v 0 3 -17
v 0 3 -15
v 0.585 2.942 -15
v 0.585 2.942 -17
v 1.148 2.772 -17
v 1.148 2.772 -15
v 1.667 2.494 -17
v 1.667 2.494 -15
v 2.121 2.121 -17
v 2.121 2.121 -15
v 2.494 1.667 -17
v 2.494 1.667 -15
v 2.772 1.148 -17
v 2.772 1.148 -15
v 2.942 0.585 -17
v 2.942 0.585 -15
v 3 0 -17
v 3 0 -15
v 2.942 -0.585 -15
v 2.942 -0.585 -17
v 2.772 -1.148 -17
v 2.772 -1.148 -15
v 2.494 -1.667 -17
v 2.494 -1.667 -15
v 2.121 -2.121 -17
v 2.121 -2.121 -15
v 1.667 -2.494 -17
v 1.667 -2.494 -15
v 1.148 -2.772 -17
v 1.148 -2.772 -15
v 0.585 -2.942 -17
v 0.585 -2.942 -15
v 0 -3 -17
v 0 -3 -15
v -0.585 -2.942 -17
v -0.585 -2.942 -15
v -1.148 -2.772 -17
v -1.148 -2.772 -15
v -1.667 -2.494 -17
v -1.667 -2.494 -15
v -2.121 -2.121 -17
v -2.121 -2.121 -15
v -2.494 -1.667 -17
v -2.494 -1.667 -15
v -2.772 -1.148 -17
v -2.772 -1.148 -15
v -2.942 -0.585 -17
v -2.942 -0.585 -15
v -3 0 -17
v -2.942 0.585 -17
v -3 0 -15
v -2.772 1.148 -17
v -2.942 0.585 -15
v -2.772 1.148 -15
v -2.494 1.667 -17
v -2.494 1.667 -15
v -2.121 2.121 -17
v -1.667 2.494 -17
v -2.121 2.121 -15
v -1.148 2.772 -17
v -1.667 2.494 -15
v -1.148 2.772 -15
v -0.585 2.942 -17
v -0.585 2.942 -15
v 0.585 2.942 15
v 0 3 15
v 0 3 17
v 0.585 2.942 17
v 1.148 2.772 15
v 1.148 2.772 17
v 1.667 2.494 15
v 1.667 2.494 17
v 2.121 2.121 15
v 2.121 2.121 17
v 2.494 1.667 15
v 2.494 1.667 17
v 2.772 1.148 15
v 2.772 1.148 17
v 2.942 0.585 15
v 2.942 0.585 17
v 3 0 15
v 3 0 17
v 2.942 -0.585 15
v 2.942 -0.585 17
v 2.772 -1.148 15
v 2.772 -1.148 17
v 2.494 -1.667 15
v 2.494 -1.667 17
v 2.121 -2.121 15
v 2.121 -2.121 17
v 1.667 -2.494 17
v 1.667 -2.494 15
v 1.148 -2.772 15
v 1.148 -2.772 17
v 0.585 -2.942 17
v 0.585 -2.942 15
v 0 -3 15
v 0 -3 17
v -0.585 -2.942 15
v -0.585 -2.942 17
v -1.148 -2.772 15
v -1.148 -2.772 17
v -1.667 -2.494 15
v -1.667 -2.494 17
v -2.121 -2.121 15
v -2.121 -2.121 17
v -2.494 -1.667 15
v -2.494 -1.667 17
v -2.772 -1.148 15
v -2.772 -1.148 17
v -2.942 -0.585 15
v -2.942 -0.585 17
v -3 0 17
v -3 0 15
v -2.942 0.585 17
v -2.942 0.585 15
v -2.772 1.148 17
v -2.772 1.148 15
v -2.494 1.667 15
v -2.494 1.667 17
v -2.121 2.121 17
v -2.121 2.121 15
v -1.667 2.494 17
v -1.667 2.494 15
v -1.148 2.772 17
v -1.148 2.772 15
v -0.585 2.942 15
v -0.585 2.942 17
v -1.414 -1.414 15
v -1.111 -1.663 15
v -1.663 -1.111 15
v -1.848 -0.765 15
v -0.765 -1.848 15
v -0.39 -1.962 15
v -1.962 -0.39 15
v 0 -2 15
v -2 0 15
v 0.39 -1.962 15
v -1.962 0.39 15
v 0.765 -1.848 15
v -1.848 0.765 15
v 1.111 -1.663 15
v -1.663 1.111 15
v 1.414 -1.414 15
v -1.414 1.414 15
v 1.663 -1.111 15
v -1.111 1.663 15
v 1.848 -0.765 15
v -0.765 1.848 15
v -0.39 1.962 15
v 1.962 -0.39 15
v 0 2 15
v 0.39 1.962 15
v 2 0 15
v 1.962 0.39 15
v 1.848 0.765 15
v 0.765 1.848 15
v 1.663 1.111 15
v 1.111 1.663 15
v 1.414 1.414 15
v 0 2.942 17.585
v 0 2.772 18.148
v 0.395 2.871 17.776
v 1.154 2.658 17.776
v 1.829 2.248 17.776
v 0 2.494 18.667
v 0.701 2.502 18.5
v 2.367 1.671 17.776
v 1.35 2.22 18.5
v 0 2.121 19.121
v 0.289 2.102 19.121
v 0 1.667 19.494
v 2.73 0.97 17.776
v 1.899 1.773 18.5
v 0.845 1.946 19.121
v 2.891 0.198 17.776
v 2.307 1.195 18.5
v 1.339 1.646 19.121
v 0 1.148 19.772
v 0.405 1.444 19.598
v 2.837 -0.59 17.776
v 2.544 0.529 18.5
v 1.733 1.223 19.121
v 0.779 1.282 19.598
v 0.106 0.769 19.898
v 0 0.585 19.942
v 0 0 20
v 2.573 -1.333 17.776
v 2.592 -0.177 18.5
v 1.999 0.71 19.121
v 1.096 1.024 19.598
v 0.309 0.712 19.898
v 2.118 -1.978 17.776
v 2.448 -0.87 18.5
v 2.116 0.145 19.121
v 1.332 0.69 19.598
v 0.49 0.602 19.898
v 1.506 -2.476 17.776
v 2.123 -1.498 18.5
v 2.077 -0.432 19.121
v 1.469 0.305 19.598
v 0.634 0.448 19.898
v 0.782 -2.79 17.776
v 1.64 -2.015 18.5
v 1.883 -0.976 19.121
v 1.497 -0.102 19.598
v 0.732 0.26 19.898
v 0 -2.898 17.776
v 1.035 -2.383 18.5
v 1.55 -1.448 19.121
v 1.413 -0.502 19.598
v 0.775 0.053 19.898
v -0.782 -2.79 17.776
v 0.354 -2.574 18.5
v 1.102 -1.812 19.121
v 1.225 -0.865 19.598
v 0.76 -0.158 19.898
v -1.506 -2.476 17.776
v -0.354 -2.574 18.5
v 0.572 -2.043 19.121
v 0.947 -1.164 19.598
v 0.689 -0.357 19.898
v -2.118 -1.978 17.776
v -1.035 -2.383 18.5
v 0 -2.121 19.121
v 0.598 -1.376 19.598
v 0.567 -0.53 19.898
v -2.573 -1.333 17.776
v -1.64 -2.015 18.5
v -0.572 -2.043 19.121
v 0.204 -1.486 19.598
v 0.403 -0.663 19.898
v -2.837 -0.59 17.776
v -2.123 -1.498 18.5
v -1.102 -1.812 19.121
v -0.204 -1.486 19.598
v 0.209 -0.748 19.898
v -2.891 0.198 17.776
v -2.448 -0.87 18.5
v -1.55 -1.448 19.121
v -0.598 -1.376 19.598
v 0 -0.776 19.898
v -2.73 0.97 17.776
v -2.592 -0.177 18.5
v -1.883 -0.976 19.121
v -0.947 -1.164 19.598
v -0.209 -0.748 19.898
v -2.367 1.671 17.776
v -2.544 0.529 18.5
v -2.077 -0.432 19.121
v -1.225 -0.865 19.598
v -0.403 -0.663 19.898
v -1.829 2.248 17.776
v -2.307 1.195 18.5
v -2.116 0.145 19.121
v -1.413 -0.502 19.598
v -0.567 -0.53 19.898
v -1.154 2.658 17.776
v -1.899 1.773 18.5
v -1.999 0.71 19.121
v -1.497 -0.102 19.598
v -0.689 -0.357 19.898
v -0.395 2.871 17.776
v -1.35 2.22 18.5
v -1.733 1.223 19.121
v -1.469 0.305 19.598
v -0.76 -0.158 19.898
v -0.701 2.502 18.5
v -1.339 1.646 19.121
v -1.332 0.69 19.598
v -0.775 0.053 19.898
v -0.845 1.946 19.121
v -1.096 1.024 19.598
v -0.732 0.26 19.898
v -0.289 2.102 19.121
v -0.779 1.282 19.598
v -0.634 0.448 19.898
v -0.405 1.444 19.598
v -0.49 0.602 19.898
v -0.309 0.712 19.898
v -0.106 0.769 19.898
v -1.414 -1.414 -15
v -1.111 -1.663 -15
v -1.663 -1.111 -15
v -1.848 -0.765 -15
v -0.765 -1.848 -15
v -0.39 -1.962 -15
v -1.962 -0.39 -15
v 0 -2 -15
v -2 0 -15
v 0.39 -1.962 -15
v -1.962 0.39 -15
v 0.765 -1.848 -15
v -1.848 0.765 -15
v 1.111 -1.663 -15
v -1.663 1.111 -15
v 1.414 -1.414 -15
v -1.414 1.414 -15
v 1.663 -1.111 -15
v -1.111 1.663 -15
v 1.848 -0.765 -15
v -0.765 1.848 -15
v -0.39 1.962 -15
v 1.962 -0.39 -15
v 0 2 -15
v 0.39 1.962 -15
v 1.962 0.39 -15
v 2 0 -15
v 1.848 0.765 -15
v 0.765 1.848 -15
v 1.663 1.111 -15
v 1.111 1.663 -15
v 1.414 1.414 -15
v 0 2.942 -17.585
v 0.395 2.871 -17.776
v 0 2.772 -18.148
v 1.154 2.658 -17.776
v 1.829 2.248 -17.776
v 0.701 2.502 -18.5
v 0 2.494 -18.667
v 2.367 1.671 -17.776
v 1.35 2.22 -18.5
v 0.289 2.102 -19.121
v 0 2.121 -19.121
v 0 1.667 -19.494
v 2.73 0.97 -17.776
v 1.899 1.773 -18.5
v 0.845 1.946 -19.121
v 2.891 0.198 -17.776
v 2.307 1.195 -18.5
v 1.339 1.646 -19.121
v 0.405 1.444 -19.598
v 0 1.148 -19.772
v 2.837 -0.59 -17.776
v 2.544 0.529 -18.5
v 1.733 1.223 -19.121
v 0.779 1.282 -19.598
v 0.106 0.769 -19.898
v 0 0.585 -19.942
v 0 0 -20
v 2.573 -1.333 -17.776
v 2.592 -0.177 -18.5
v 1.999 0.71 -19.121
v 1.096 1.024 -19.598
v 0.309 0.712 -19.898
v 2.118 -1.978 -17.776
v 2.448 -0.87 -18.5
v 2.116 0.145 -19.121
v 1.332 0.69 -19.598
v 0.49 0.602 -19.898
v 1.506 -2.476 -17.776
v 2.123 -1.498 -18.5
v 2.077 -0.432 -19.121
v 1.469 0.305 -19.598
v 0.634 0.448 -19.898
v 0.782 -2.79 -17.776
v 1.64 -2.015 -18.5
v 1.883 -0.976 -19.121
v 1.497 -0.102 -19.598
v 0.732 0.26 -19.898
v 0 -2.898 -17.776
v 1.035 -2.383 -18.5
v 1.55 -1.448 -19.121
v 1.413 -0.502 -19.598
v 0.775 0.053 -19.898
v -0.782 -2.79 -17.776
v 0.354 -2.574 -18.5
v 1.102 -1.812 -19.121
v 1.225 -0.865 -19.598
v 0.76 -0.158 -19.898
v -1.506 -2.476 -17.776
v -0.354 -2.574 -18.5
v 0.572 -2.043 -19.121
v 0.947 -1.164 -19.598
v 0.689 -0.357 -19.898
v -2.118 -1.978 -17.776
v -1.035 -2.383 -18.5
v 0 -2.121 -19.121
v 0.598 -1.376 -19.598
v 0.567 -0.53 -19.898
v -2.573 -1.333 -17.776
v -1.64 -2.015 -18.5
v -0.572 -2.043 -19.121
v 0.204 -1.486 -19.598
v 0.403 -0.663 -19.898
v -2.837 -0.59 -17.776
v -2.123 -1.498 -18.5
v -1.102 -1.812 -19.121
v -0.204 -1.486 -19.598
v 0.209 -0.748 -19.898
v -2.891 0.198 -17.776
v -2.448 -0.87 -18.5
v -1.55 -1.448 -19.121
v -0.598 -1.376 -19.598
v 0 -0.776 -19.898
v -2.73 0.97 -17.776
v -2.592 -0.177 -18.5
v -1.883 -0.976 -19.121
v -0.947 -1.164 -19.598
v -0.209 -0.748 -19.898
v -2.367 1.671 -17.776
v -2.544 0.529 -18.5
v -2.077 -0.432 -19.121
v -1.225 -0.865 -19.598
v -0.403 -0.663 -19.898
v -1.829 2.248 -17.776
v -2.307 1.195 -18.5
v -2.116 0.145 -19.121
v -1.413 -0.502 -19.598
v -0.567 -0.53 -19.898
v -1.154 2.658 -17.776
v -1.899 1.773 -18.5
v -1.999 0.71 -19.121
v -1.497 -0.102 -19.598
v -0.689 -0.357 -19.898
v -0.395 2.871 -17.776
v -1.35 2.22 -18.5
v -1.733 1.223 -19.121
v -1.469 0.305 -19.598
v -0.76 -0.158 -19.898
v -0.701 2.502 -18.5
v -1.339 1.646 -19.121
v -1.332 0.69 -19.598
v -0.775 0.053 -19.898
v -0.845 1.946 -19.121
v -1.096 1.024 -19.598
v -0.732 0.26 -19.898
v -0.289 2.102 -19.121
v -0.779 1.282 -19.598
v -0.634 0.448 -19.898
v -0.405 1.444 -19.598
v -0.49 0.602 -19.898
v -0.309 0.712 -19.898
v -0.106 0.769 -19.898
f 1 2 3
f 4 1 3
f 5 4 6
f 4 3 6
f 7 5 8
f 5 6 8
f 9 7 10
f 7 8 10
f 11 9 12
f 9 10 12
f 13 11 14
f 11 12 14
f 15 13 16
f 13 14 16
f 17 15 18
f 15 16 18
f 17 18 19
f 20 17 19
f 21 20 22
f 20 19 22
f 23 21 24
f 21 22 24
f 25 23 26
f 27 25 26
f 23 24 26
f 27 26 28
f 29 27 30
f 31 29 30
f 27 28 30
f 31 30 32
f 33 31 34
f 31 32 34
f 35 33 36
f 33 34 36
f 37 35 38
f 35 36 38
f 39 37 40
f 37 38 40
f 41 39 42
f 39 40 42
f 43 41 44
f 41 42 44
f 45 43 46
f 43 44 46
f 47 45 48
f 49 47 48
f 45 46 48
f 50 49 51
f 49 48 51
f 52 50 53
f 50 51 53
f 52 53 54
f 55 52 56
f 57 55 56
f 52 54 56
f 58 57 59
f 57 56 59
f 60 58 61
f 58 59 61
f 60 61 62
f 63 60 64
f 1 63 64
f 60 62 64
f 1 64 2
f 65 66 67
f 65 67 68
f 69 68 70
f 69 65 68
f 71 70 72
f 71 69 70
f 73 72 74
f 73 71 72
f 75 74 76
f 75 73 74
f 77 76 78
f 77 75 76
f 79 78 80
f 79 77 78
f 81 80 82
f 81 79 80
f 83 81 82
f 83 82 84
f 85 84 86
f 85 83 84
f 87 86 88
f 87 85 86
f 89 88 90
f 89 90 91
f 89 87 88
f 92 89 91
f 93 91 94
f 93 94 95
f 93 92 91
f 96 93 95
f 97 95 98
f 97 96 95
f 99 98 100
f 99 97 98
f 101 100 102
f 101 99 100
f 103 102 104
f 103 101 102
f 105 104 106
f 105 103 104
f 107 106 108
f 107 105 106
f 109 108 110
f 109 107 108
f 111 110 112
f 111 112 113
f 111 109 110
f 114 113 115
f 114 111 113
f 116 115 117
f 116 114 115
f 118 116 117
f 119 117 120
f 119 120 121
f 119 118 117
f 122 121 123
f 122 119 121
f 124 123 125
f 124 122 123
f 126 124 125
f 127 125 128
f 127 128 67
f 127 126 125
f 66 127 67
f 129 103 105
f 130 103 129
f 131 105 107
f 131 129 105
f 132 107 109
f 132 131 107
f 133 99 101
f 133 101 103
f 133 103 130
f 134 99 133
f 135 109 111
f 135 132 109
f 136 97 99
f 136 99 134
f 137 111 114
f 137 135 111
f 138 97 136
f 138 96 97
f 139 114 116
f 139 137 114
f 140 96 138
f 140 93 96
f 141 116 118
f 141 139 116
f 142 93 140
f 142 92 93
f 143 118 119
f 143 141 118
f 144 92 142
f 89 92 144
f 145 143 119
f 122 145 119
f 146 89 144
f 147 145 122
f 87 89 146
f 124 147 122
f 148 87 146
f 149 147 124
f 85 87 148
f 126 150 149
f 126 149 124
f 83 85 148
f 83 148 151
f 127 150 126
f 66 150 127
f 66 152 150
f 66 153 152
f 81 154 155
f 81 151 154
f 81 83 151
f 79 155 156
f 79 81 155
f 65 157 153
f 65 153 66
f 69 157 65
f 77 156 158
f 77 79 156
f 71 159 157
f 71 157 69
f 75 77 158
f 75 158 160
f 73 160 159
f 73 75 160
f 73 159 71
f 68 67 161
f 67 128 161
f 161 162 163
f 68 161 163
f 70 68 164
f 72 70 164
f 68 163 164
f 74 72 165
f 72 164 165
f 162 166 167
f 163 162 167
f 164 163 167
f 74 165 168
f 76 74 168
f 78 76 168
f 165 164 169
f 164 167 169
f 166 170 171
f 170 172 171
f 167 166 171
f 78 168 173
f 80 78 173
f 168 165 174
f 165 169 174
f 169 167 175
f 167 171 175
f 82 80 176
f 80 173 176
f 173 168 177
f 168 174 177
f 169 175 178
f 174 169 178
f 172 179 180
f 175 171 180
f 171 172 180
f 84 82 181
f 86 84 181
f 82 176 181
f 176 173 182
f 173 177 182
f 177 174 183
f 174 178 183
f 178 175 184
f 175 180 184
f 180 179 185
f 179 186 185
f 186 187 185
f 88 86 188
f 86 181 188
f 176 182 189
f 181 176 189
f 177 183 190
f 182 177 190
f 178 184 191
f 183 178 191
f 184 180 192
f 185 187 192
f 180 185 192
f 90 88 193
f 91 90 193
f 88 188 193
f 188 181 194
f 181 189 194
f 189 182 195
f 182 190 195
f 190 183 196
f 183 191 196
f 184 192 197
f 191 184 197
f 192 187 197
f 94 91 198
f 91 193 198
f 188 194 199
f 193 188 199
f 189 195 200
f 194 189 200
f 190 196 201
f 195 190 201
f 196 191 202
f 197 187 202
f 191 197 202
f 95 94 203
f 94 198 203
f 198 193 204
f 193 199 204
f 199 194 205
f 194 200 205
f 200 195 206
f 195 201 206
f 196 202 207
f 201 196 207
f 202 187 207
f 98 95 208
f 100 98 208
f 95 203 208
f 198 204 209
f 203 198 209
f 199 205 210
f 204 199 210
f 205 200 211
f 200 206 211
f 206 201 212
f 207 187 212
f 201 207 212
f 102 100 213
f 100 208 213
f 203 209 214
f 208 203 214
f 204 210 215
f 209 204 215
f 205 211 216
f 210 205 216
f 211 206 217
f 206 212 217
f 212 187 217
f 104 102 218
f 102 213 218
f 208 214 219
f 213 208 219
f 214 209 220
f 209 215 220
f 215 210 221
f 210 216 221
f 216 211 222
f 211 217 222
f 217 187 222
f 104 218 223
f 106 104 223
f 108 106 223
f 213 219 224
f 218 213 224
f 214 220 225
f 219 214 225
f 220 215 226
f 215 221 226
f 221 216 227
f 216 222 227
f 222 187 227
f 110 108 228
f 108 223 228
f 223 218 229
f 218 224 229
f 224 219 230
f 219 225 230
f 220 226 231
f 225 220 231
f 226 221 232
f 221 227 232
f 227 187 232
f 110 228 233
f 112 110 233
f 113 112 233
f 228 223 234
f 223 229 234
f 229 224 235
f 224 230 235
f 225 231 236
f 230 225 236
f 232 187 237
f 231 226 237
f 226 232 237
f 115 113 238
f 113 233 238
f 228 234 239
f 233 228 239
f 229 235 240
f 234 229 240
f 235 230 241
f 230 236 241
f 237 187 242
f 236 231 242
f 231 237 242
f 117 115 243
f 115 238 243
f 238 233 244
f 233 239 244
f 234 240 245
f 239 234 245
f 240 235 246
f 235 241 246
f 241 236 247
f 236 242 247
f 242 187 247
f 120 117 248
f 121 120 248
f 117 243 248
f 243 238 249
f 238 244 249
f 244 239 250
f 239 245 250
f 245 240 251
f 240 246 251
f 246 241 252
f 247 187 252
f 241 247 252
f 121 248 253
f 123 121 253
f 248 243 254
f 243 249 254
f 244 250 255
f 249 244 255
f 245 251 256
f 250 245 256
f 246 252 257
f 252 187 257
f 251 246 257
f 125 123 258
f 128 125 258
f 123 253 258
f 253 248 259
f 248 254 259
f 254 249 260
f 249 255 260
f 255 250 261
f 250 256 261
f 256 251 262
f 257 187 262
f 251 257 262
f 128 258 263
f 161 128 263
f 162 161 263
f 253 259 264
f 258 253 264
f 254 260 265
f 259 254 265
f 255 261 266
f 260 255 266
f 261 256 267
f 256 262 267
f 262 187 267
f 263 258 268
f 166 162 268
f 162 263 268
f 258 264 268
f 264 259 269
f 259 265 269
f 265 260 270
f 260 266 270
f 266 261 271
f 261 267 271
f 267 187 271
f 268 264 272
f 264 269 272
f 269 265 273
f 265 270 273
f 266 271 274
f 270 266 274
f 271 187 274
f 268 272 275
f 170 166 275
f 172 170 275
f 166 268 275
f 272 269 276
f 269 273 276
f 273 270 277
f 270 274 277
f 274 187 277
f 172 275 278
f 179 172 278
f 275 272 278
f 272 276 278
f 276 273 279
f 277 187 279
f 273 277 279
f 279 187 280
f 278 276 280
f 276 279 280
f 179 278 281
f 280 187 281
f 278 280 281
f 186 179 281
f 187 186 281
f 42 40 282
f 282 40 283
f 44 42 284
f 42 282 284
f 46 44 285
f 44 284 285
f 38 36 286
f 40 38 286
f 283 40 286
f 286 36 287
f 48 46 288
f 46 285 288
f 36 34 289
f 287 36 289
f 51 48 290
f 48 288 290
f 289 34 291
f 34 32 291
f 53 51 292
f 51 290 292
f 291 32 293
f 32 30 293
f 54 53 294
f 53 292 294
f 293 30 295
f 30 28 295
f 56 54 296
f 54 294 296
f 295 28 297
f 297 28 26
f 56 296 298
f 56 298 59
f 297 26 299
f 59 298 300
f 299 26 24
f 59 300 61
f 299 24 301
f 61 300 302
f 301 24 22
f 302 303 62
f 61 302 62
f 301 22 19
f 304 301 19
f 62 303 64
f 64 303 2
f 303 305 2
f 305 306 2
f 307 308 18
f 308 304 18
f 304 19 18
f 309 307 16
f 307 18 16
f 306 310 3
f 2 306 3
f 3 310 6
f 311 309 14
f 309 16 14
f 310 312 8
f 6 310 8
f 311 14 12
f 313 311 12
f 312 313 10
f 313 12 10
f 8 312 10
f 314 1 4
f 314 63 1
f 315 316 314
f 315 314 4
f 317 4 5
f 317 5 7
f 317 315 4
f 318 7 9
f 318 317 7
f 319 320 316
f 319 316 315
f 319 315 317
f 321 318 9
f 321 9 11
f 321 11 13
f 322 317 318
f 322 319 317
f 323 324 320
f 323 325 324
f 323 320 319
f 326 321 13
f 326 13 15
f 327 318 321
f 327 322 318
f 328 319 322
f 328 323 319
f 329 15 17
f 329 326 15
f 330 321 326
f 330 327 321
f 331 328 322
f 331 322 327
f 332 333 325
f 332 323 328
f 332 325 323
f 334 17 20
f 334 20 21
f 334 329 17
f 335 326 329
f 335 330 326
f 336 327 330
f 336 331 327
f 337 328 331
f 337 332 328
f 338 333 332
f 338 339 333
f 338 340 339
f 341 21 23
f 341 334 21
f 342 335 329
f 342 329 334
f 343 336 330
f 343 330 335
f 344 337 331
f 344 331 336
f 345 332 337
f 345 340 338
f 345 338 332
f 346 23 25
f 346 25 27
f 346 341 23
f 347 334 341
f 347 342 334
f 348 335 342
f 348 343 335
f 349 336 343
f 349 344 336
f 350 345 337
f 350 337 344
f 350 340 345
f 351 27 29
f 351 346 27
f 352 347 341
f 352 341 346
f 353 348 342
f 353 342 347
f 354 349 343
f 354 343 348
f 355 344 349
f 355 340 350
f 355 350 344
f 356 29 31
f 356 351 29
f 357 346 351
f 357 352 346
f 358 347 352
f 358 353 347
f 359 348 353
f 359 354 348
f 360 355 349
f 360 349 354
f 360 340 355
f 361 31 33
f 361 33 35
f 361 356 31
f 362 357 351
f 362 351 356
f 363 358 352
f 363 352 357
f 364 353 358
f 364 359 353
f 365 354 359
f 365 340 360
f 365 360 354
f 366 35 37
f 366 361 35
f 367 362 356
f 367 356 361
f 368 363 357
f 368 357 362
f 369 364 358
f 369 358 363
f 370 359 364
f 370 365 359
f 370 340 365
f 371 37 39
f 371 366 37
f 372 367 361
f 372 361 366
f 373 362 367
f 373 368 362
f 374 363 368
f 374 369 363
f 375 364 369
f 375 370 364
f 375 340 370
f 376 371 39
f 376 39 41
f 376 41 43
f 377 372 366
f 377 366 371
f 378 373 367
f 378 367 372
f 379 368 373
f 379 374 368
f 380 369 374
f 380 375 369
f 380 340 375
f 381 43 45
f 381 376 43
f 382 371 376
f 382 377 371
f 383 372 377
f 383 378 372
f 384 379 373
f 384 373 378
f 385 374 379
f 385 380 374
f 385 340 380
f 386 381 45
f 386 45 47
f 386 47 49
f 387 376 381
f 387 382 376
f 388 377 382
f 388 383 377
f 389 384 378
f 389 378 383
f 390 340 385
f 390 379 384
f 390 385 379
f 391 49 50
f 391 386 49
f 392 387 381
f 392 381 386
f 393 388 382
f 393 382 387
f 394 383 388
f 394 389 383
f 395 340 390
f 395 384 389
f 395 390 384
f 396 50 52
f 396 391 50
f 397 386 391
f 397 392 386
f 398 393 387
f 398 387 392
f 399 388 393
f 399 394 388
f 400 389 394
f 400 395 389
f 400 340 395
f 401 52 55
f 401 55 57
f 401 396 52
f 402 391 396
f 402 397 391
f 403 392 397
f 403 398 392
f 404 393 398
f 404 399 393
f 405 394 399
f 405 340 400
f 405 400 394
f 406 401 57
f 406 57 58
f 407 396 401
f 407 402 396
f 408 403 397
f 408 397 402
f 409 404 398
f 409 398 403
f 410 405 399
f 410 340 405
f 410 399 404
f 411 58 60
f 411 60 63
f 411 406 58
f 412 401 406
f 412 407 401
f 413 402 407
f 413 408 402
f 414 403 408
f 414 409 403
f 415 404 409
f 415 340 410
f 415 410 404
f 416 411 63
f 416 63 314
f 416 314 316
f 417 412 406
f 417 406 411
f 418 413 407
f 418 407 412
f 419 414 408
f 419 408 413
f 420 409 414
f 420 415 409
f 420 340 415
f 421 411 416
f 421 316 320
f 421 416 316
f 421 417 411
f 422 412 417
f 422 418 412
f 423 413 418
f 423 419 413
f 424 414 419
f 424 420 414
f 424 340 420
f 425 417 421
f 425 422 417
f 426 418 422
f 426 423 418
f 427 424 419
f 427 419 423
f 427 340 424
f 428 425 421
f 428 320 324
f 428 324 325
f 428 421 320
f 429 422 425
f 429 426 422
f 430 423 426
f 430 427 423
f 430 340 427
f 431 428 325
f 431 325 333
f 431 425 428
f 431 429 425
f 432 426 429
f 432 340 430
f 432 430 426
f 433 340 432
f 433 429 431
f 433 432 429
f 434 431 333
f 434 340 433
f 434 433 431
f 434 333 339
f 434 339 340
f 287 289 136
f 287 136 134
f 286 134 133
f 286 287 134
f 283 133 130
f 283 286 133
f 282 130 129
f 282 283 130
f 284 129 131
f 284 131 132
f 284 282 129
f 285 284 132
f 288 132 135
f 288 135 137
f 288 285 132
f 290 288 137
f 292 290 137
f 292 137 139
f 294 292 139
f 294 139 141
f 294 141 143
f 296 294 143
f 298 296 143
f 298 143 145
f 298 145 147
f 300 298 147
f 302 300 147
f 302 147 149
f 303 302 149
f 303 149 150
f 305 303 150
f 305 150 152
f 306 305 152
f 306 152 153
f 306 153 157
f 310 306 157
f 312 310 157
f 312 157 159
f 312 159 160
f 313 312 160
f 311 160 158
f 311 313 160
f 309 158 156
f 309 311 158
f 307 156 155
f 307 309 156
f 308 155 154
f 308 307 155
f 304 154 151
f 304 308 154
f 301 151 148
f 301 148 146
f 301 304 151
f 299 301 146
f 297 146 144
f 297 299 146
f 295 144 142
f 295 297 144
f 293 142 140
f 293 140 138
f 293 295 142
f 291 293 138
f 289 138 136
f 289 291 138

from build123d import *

# Parameters (mm, degrees)
SWEEP1_PROFILE_R     = 2
SKETCH11_R           = 3
BOSS_EXTRUDE1_DEPTH  = 5
FILLET2_R            = 3
FILLET2_OF_MIRROR1_R = 3


with BuildPart() as part:
    # Sweep1: sweep along a path in Sketch1
    with BuildLine(Plane(origin=(0, 0, 0), x_dir=(0, 0, -1), z_dir=(1, 0, 0))) as sweep1_path:
        Line((-14.999999972, 0), (14.999999972, 0))
    # Sweep1 profile (on start of the path) → Sweep1 (sweep)
    with BuildSketch(Plane(origin=(0, 0, 14.999999972), x_dir=(0, -1, 0), z_dir=(0, 0, -1))):
        Circle(SWEEP1_PROFILE_R)
    sweep(path=sweep1_path.line)

    # Sketch11 → Boss-Extrude1 (add)
    with BuildSketch(Plane(origin=(0, 0, -14.999999972), x_dir=(-1, 0, 0), z_dir=(0, 0, -1))):
        with Locations(Location((0, 0, 0), (0, 0, 90))):
            Circle(SKETCH11_R)
    boss_extrude1 = extrude(amount=BOSS_EXTRUDE1_DEPTH)

    # Fillet2
    fillet2_edges = [part.edges().sort_by_distance(p)[0] for p in [
        (0, -3, -19.999999972),
    ]]
    fillet(fillet2_edges, radius=FILLET2_R)

    # Mirror1: Boss-Extrude1 across plane
    add(boss_extrude1.mirror(Plane.XY))

    # Fillet2 of Mirror1
    fillet2_of_mirror1_edges = [part.edges().sort_by_distance(p)[0] for p in [
        (0, -3, 19.999999972),
    ]]
    fillet(fillet2_of_mirror1_edges, radius=FILLET2_OF_MIRROR1_R)


solid = part.part
